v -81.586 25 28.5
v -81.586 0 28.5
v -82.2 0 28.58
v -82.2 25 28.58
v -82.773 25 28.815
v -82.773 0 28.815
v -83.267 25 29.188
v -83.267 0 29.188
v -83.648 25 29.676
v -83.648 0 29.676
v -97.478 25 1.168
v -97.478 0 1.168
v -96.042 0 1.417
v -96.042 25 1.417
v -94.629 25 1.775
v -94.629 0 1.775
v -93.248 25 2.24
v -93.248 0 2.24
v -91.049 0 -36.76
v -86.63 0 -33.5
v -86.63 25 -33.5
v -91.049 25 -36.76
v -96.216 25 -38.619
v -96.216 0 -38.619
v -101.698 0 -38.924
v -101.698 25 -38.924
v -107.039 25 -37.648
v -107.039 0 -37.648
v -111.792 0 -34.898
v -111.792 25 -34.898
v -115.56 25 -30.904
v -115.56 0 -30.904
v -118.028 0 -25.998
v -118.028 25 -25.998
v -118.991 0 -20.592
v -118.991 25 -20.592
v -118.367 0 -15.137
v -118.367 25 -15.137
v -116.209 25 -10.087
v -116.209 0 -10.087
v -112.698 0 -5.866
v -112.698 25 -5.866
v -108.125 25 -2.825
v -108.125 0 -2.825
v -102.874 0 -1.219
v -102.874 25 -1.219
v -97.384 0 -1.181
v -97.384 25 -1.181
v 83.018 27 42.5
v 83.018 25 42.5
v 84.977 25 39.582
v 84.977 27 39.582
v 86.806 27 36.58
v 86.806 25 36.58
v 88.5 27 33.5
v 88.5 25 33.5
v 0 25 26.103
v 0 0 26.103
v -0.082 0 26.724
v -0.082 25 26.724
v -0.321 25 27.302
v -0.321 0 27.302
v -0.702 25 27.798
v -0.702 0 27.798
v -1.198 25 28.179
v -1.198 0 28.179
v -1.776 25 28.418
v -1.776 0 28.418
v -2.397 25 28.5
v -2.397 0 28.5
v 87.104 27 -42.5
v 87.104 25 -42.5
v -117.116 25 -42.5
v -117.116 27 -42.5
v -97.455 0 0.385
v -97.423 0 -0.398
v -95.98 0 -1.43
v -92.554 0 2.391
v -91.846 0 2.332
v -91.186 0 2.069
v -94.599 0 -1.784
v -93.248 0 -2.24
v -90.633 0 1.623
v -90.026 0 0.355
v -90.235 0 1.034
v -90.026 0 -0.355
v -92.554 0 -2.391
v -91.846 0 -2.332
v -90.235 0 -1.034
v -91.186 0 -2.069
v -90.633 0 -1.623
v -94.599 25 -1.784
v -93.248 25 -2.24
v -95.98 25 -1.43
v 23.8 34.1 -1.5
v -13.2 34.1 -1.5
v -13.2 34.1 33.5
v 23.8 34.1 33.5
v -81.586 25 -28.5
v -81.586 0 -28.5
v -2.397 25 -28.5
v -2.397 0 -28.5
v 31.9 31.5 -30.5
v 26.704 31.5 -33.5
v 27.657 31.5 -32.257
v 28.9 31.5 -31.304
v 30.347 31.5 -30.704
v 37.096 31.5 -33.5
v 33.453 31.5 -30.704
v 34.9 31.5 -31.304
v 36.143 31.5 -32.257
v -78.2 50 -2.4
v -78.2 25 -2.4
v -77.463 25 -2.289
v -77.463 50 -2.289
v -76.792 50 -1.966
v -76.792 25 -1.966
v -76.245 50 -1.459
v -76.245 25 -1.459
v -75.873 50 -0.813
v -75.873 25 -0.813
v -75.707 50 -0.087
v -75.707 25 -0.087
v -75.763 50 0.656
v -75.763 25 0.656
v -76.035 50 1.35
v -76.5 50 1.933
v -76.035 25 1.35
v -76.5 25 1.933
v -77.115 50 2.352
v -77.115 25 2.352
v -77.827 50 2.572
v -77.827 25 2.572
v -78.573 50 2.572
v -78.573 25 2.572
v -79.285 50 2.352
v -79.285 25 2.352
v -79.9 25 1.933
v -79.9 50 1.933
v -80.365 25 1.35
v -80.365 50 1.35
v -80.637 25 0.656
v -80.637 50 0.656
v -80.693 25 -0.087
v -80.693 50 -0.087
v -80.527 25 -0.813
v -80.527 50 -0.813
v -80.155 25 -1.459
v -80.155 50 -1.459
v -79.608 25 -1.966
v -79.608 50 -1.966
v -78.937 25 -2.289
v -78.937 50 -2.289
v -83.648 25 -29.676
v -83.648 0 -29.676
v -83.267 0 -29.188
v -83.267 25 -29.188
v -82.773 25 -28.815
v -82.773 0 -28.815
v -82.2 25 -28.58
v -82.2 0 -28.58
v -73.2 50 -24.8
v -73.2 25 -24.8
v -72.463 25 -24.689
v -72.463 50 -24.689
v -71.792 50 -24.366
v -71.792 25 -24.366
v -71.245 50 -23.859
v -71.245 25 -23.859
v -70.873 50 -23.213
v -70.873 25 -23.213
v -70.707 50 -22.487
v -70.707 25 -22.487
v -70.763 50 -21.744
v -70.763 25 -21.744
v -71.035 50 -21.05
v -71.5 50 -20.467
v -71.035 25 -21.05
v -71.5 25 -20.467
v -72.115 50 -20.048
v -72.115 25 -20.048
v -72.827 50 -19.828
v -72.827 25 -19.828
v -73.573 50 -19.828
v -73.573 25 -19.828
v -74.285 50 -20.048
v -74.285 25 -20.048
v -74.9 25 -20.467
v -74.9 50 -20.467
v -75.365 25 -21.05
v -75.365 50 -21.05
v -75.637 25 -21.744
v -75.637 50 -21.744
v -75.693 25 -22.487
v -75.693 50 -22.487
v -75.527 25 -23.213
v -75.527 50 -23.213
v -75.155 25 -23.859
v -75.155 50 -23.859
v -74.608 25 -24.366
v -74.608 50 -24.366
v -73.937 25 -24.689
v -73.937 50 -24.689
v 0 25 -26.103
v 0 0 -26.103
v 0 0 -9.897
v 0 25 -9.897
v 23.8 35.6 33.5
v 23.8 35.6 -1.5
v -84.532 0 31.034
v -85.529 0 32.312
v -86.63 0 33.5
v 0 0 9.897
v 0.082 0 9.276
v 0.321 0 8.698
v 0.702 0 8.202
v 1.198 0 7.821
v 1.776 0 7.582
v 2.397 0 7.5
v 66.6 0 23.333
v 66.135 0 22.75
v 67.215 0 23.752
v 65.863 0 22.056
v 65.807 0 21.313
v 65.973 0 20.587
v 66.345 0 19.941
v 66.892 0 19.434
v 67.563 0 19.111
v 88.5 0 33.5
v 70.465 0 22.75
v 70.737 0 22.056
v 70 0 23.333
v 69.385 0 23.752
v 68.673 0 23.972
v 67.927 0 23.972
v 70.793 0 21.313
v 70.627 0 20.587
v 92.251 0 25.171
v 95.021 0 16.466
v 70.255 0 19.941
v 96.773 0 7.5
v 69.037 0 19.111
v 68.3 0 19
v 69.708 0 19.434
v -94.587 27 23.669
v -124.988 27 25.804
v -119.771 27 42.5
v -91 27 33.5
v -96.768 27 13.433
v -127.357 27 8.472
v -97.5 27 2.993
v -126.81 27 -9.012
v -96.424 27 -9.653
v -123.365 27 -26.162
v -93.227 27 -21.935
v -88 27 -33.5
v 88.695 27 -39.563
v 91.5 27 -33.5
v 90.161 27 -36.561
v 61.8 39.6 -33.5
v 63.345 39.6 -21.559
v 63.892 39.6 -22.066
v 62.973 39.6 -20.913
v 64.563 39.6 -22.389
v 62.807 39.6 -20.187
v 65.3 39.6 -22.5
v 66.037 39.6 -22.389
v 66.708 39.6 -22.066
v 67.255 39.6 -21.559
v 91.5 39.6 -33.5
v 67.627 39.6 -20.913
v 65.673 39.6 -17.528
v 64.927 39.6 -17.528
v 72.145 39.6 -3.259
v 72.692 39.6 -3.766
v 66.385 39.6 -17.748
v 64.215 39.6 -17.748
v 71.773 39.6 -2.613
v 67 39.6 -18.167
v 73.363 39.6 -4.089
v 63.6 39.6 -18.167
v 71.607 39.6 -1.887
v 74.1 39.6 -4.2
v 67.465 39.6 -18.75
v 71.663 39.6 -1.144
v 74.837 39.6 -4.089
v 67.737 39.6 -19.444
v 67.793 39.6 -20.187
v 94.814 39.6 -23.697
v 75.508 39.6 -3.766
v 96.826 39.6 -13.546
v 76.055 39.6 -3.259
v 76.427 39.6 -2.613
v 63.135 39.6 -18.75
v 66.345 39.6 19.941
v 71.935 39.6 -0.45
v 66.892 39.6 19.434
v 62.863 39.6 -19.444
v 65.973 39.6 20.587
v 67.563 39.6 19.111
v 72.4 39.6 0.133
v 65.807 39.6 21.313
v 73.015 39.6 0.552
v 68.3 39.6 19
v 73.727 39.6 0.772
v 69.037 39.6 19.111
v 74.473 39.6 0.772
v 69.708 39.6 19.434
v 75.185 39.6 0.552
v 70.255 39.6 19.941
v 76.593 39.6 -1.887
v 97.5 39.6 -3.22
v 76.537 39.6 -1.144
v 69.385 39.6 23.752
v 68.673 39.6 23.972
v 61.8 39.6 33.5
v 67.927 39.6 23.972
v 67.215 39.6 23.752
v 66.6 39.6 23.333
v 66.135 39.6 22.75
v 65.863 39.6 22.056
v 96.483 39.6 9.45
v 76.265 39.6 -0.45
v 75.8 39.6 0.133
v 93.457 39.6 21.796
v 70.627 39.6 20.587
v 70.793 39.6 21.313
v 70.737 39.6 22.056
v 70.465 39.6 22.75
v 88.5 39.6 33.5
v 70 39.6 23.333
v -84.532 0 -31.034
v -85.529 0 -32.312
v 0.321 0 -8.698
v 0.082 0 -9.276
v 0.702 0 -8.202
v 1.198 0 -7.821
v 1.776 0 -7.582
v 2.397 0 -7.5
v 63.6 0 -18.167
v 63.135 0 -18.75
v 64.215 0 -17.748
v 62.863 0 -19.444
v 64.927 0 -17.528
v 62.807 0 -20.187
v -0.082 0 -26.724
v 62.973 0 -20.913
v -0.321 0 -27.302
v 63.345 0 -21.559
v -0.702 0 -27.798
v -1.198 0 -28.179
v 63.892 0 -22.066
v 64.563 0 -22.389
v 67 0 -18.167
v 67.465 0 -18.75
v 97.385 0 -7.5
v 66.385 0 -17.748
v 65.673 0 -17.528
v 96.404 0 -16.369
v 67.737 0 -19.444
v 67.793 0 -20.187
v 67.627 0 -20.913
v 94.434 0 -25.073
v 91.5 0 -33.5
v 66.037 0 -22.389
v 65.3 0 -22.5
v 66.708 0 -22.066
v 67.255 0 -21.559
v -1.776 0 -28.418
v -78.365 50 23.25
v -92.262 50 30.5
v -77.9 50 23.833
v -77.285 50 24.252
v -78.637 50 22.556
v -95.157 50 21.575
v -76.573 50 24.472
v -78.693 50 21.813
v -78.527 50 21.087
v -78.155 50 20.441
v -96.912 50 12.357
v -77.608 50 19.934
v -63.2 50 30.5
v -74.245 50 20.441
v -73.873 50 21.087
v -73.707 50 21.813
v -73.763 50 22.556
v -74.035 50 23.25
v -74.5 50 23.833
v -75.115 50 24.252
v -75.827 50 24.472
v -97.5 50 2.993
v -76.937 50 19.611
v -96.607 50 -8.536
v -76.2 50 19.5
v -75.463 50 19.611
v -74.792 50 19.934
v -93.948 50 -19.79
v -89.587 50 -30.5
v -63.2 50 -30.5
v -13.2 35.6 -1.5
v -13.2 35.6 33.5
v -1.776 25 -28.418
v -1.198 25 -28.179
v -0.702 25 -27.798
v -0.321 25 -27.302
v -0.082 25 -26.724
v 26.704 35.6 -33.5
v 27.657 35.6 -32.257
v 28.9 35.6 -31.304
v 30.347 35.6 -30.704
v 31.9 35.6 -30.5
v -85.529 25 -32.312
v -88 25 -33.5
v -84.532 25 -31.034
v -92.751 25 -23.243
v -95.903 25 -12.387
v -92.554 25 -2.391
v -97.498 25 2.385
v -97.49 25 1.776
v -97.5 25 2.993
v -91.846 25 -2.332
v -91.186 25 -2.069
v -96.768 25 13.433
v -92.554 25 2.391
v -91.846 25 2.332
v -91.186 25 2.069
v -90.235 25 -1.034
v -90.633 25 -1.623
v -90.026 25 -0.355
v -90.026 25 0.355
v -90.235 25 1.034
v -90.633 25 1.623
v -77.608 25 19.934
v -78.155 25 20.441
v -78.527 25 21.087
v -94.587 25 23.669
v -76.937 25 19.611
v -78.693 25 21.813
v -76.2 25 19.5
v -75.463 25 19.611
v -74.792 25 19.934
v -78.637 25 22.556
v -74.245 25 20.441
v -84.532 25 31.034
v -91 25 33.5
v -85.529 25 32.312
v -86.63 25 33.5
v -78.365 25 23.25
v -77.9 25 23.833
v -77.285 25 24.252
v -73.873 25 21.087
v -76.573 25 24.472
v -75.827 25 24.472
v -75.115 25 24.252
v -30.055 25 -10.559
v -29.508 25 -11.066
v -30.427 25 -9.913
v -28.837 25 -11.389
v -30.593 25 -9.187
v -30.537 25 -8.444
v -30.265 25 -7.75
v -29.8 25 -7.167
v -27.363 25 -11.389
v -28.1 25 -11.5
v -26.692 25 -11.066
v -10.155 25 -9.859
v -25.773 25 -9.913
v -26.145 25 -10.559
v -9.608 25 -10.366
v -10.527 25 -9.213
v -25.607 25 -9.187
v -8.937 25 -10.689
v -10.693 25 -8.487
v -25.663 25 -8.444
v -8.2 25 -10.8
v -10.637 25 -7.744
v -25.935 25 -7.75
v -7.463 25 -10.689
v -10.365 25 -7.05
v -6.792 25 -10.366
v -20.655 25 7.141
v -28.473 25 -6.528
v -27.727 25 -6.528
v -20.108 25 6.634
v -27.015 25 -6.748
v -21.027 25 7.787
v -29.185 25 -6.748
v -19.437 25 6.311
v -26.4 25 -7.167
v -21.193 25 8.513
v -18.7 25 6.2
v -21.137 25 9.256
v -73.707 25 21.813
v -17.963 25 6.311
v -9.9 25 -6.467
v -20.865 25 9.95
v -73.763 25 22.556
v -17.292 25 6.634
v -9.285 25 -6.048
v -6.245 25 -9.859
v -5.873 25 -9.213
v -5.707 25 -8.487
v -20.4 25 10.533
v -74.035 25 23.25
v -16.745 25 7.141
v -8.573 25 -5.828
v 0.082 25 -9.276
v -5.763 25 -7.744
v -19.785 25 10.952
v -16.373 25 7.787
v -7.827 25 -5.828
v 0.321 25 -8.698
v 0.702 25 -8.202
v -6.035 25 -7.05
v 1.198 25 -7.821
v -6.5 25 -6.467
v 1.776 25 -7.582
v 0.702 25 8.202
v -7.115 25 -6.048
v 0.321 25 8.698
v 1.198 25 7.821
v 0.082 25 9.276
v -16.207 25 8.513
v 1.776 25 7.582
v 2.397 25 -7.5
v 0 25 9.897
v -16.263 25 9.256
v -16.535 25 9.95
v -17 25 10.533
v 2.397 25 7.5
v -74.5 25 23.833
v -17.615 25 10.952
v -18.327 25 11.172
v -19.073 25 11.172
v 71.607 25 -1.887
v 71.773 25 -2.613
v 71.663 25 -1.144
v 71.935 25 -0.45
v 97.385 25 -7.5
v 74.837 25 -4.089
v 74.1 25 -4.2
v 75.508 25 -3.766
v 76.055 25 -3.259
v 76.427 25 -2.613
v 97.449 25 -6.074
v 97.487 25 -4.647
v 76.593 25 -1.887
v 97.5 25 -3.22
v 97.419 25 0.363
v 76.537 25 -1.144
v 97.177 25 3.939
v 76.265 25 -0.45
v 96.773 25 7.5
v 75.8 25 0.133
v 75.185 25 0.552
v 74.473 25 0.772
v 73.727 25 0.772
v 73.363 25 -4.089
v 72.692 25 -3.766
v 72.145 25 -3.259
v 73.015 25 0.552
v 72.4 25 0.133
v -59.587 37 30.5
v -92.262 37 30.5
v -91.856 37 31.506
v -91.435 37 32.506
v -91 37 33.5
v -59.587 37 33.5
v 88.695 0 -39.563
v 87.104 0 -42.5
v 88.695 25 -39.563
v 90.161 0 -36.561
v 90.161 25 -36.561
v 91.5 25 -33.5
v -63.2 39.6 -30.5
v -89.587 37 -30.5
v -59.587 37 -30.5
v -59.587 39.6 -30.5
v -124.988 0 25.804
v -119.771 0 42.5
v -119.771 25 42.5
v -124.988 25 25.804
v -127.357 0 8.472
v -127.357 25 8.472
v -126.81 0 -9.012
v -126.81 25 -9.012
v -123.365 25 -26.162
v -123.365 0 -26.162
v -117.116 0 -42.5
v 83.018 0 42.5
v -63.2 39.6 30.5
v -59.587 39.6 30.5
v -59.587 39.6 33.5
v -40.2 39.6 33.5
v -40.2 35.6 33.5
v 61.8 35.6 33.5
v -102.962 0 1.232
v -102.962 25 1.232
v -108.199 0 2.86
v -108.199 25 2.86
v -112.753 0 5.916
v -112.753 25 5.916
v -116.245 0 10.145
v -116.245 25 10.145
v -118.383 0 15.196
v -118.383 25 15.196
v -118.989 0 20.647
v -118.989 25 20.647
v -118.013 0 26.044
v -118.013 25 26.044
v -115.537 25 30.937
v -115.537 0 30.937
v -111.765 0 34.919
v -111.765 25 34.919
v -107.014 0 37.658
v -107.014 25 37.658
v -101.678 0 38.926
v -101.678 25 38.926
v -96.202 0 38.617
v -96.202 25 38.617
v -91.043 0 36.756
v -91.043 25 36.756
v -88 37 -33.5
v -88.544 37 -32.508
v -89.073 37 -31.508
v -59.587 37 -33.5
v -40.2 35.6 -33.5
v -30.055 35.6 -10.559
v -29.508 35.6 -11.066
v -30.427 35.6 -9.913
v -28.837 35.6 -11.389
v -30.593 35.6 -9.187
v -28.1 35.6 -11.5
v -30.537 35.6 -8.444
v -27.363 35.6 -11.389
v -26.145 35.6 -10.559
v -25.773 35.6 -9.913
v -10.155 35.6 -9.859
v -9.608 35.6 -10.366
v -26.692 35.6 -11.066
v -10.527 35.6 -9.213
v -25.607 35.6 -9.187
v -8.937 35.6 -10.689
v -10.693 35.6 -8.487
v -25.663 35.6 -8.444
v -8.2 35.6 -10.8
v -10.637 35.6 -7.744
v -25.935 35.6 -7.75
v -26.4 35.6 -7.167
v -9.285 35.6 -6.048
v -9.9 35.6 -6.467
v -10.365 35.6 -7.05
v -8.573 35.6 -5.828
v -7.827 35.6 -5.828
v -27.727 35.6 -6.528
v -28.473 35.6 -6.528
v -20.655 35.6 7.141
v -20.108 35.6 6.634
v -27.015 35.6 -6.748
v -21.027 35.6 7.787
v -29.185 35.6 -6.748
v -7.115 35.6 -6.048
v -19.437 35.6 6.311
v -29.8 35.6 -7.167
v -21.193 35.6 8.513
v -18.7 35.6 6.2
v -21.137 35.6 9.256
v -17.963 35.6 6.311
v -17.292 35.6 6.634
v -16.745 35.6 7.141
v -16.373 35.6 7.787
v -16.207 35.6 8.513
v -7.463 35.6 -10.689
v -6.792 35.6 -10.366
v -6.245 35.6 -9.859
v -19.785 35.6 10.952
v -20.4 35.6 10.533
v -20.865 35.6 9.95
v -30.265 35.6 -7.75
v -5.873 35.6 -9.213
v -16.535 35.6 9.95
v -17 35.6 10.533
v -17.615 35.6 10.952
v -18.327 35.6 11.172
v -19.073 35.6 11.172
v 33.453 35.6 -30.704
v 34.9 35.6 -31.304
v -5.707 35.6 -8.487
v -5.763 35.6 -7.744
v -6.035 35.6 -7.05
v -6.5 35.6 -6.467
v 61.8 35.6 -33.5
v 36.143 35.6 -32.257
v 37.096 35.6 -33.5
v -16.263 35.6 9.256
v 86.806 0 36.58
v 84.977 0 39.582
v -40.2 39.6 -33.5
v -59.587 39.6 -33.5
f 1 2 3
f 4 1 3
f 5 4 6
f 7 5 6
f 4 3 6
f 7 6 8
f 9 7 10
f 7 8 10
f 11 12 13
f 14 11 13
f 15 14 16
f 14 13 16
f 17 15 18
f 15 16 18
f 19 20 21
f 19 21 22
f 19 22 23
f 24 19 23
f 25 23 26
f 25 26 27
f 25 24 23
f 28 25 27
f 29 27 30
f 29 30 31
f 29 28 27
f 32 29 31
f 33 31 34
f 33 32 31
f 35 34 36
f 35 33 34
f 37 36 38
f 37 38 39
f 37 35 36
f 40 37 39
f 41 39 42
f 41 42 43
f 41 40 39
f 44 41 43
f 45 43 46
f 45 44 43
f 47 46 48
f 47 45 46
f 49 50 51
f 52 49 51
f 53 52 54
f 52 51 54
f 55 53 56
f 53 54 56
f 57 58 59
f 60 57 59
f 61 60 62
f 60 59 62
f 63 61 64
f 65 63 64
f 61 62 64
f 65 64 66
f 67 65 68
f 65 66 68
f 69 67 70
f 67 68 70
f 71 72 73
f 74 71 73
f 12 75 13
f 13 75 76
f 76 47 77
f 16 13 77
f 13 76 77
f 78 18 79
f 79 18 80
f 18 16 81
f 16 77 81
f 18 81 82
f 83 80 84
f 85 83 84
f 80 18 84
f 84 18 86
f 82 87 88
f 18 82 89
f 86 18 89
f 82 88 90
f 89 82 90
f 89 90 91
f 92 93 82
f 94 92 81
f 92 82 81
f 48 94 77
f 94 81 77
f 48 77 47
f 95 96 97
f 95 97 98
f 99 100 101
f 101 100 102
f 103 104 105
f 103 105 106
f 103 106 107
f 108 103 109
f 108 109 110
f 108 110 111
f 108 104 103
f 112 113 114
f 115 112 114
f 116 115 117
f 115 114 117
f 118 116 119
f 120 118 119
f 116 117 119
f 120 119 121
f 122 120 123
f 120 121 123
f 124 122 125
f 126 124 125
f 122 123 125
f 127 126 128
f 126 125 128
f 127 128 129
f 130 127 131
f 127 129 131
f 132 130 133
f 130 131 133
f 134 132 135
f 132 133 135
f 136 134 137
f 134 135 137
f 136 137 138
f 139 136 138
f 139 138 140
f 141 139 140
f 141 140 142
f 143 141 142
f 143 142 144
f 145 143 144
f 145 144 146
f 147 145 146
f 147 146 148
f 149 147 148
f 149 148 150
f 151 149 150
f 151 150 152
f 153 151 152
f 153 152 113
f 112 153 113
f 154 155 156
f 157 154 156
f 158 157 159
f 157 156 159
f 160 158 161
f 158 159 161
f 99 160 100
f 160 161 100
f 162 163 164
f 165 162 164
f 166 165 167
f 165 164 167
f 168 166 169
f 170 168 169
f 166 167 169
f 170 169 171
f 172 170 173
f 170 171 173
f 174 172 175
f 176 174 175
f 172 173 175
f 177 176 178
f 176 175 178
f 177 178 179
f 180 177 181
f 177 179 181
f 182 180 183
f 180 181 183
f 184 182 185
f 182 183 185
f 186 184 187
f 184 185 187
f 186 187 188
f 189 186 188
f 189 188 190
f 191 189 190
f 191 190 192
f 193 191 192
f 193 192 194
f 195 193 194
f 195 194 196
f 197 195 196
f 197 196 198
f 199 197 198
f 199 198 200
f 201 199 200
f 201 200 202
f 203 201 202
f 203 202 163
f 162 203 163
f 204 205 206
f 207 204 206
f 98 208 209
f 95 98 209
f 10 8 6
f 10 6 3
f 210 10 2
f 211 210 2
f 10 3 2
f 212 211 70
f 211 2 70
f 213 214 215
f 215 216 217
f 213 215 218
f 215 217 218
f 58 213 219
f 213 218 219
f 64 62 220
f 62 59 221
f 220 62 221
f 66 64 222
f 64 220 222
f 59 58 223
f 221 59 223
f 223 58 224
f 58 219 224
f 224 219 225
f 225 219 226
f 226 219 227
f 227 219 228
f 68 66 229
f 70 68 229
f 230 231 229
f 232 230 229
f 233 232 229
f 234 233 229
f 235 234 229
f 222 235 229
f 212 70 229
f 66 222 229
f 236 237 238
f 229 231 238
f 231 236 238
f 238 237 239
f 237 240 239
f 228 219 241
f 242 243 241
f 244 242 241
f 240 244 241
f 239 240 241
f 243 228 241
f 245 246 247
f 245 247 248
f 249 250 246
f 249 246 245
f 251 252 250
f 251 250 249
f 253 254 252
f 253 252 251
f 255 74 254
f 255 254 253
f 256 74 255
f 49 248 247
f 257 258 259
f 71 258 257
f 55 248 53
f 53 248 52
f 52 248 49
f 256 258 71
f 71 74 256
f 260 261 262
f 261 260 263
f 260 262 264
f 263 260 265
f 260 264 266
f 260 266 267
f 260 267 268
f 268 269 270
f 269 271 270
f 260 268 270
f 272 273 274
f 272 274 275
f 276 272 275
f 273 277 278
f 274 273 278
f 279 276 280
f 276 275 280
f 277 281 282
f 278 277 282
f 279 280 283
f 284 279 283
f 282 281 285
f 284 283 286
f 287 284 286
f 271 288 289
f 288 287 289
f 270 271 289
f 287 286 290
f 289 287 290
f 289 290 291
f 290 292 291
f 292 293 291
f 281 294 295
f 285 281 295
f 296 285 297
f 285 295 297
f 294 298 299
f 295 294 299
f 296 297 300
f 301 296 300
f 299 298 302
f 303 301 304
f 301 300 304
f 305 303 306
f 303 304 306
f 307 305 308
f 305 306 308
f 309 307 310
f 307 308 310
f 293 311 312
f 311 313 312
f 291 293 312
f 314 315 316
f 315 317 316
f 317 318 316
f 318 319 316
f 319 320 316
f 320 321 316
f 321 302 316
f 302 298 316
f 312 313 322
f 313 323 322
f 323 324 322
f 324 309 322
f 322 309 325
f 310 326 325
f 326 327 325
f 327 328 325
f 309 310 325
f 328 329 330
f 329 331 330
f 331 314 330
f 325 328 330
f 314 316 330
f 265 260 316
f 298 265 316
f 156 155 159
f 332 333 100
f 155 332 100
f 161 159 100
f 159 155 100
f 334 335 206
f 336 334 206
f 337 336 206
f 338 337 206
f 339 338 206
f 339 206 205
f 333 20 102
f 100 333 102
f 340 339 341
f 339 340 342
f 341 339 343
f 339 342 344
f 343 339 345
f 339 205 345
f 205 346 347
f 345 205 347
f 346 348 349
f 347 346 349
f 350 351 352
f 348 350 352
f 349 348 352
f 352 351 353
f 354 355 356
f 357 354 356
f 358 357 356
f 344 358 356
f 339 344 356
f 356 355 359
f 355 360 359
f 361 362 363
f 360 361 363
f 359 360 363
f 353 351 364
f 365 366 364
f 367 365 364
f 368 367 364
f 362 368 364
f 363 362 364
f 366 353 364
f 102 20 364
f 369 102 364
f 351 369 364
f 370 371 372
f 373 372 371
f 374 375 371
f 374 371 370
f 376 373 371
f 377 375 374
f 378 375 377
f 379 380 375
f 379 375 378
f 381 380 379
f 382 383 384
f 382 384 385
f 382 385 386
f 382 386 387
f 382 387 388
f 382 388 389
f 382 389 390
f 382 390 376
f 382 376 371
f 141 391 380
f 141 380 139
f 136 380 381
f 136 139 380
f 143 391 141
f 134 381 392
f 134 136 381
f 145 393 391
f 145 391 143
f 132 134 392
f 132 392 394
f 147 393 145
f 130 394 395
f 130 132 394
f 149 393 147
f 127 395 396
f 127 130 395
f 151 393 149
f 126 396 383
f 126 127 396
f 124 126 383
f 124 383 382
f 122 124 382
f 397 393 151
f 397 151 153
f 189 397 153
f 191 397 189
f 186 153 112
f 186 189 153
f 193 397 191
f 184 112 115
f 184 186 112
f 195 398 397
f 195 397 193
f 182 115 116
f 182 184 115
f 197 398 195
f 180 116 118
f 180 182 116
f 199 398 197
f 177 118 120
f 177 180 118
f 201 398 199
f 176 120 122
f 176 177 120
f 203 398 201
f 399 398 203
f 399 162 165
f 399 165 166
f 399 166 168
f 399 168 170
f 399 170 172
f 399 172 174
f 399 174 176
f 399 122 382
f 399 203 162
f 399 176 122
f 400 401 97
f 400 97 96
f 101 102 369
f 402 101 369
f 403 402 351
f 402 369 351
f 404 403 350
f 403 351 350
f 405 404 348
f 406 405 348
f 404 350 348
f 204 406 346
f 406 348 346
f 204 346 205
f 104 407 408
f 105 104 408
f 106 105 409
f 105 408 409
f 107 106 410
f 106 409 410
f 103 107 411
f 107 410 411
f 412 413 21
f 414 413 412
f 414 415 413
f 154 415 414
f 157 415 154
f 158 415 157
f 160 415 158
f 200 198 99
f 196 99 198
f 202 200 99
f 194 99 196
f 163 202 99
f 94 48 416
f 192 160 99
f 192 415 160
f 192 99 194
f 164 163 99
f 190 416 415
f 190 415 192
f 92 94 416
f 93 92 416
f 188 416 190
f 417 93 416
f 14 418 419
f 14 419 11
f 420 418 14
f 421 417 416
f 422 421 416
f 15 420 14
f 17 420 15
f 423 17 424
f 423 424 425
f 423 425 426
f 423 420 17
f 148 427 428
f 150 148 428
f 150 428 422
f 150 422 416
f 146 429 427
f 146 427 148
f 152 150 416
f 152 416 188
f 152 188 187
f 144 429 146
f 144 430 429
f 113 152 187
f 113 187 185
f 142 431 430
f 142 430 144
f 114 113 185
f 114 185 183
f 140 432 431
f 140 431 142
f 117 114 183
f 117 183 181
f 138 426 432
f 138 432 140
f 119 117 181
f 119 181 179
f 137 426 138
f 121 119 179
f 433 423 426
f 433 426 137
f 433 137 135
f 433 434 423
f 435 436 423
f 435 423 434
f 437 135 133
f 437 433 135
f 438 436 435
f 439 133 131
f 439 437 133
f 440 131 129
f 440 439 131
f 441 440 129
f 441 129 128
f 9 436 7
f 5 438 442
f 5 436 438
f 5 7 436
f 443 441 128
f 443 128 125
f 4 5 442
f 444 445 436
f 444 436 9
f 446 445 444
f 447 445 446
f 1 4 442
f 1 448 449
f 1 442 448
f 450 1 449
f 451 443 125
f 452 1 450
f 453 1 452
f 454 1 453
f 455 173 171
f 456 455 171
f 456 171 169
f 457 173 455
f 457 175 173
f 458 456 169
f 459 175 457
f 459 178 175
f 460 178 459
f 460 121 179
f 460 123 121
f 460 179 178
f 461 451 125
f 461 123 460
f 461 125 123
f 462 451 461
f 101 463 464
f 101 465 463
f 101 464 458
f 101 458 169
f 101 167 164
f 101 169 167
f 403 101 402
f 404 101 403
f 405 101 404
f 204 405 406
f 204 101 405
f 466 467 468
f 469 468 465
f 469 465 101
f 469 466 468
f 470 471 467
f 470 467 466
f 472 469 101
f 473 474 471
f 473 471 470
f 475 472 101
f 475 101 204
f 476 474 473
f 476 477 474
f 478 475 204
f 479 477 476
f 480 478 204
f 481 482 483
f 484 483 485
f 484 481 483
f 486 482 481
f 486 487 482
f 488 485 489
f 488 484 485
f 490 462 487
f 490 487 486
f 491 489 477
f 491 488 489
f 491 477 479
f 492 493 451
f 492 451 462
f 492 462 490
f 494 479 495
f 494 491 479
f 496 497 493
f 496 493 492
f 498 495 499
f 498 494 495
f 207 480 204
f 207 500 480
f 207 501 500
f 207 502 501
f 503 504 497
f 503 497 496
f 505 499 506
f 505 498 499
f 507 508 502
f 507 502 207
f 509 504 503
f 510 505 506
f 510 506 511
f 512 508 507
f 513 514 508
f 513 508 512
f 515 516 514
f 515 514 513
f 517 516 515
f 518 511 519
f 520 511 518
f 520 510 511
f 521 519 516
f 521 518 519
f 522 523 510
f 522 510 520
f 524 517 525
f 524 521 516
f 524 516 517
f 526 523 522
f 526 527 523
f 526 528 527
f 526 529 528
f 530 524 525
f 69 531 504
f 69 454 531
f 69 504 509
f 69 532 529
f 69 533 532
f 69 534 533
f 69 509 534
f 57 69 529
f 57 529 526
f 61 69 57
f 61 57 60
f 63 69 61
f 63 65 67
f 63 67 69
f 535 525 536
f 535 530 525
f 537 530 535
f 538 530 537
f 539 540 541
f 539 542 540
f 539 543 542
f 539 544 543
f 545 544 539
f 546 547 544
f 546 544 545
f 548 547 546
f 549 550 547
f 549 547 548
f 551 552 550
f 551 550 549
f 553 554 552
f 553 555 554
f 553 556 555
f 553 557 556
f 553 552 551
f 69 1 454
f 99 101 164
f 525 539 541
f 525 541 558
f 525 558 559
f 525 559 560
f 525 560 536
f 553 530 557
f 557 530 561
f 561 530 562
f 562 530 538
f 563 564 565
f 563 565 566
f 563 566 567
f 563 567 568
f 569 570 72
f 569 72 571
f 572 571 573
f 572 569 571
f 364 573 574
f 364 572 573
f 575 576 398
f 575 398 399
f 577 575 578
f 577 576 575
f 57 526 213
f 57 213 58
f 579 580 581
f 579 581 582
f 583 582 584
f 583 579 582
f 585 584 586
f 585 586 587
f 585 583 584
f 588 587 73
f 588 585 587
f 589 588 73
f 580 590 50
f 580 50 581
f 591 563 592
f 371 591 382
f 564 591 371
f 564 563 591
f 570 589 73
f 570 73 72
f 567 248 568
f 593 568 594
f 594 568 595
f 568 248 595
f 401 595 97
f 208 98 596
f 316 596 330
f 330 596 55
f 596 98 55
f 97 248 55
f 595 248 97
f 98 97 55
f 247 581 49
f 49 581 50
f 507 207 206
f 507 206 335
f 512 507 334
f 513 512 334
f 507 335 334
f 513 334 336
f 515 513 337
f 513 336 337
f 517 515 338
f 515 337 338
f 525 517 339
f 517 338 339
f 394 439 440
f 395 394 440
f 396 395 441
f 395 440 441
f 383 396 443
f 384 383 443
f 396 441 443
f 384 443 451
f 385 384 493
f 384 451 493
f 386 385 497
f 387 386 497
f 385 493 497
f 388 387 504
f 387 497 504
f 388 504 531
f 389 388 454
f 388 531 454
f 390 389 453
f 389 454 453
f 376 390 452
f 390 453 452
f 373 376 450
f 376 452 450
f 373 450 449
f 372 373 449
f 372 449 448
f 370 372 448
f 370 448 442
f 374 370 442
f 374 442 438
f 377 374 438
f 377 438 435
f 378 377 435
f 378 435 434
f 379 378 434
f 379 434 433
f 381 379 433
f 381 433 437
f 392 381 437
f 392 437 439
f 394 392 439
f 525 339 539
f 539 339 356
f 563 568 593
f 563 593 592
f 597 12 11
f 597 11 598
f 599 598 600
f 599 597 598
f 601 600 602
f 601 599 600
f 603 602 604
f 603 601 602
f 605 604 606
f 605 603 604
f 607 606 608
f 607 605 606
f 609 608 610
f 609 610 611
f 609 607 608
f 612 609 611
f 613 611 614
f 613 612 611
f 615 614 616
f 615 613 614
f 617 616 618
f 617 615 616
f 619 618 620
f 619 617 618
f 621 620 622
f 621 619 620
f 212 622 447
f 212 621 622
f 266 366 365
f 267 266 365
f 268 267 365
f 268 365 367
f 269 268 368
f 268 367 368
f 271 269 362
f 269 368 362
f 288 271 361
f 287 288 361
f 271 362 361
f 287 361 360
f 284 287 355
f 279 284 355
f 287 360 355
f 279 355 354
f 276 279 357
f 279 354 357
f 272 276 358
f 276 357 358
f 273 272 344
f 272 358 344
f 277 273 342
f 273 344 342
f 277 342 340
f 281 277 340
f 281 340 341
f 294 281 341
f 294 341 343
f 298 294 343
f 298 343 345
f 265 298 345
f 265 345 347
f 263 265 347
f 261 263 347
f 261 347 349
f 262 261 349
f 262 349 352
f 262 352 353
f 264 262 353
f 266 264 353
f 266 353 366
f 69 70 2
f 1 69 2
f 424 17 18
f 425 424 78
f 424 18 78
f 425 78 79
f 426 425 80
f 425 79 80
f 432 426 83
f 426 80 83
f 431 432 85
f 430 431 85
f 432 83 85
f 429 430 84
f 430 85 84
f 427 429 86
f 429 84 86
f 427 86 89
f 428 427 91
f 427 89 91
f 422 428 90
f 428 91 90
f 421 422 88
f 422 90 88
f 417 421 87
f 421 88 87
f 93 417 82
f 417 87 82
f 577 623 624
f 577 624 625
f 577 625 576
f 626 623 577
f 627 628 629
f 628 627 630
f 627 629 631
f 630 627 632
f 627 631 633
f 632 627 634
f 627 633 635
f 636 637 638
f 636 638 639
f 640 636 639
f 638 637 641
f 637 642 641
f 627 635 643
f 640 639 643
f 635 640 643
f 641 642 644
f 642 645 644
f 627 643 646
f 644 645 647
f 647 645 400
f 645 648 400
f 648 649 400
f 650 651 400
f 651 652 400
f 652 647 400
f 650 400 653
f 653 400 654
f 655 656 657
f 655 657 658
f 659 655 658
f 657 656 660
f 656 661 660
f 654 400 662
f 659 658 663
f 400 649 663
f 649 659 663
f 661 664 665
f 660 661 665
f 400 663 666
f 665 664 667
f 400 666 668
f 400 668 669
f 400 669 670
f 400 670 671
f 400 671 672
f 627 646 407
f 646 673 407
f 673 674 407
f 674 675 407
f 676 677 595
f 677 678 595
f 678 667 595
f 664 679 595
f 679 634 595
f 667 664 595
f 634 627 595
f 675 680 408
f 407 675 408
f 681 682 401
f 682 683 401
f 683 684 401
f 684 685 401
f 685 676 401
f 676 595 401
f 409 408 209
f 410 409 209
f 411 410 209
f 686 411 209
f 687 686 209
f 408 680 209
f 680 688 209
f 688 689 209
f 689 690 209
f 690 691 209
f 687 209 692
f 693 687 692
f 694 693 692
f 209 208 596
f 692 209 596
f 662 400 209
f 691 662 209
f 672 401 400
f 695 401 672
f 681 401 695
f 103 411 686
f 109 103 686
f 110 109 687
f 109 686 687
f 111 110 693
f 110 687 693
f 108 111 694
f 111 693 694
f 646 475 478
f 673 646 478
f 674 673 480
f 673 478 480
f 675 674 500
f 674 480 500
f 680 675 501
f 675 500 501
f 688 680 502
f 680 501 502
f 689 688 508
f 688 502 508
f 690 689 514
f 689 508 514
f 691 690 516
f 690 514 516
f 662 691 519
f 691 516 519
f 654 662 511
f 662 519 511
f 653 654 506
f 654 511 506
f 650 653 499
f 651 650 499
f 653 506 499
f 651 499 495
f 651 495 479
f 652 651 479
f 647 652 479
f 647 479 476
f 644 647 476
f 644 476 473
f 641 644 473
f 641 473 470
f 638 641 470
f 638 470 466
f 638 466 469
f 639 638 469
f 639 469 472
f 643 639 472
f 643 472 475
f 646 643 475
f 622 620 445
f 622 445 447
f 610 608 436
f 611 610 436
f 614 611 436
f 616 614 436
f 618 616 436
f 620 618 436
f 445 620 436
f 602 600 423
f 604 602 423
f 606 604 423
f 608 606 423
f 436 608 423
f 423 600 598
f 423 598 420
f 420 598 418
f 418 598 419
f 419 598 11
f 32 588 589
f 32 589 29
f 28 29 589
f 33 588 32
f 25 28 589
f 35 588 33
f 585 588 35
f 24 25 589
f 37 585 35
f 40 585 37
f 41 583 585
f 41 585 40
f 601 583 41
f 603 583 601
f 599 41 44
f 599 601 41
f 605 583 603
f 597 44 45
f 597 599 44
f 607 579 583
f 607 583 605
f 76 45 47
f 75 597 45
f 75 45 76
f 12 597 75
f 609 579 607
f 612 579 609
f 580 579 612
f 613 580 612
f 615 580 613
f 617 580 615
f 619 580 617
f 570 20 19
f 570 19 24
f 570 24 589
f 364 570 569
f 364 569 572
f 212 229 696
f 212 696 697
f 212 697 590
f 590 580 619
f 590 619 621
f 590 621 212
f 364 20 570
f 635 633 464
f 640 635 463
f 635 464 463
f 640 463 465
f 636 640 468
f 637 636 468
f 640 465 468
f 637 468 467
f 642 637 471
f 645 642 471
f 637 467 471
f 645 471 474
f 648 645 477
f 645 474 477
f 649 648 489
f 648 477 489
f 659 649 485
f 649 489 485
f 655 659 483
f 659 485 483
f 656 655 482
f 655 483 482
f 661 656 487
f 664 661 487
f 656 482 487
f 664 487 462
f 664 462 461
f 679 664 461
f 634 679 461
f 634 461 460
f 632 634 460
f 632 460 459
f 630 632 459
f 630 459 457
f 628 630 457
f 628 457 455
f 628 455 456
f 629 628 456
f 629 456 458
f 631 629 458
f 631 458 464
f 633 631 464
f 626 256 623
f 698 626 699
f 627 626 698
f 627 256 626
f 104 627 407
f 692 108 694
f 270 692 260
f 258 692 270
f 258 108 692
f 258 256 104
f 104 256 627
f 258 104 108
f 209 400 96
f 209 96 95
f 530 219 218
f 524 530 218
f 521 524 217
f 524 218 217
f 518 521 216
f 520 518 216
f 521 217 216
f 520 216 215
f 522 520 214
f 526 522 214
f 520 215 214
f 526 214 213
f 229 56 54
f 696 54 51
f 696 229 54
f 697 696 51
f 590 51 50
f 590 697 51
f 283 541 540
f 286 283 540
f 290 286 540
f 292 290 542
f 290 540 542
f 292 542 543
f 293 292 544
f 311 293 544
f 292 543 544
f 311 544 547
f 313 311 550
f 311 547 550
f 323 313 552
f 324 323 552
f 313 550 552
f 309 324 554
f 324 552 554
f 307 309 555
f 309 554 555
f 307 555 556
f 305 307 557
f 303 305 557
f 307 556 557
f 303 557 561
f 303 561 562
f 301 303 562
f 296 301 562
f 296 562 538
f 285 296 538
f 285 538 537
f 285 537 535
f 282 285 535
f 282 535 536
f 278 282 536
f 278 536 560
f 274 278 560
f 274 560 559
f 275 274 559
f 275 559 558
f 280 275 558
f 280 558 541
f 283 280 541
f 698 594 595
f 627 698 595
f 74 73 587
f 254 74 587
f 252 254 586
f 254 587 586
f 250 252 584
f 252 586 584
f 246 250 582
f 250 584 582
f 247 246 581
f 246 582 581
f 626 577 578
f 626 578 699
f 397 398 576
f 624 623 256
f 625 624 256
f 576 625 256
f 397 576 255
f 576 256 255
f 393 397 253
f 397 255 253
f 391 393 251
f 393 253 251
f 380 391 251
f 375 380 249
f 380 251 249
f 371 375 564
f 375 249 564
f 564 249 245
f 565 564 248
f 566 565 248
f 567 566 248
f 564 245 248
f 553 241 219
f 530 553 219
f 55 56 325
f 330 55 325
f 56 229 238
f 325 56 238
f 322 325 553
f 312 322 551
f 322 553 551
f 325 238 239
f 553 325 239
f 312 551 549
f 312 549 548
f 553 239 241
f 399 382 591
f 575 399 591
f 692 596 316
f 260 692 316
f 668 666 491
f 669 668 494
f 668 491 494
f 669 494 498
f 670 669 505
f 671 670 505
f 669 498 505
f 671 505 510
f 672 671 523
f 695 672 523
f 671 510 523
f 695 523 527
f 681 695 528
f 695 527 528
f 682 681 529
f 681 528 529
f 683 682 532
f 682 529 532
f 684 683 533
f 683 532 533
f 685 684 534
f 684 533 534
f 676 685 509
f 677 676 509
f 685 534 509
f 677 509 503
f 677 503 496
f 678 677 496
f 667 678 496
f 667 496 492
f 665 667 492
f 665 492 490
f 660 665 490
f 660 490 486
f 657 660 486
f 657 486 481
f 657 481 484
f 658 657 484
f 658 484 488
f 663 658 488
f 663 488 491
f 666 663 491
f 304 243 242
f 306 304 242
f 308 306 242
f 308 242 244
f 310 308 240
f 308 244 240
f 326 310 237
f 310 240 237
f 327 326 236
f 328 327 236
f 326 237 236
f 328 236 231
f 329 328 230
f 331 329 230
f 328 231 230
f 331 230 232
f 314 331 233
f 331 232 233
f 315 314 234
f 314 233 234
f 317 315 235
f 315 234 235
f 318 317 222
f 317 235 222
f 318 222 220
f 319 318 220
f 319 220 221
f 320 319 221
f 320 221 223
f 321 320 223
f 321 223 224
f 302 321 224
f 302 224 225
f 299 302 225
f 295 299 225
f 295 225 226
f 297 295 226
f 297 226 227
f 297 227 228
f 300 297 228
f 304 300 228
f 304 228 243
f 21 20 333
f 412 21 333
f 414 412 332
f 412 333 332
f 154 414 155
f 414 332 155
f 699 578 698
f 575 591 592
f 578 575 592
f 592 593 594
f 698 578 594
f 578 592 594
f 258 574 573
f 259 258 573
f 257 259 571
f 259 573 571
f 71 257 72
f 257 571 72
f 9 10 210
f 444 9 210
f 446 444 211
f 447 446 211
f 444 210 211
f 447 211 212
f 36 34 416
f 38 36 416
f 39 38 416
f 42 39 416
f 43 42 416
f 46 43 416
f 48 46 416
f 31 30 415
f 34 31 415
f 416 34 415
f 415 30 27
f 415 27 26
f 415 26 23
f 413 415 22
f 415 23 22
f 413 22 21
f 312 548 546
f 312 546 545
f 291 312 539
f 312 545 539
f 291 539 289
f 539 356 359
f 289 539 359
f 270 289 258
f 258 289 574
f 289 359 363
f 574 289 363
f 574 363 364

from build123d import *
from build123d.topology import SkipClean

# Parameters (mm, degrees)
SKETCH1_W           = 195
SKETCH1_H           = 67
BOSS_EXTRUDE1_DEPTH = 50
CUT_EXTRUDE1_DEPTH  = 115.579666608
CUT_EXTRUDE2_DEPTH  = 129.433835106
CUT_EXTRUDE3_START  = -13
SKETCH4_W           = 3.612655346
SKETCH4_H           = 3
CUT_EXTRUDE3_DEPTH  = 13
SKETCH6_R           = 2.5
CUT_EXTRUDE4_DEPTH  = 115.579666608
SKETCH7_W           = 37
SKETCH7_H           = 35
CUT_EXTRUDE5_DEPTH  = 1.5
CUT_EXTRUDE6_DEPTH  = 18.5
SKETCH9_R           = 2.5
CUT_EXTRUDE7_DEPTH  = 25
BOSS_EXTRUDE2_START = 25
BOSS_EXTRUDE2_DEPTH = 25
BOSS_EXTRUDE3_DEPTH = 2


with BuildPart() as part:
    # Sketch1 → Boss-Extrude1 (new body)
    with BuildSketch(Plane(origin=(0, 0, 0), x_dir=(1, 0, 0), z_dir=(0, 1, 0))):
        Rectangle(SKETCH1_W, SKETCH1_H)
    extrude(amount=BOSS_EXTRUDE1_DEPTH)

    # Sketch2 → Cut-Extrude1 (cut, through all)
    with BuildSketch(Plane.XZ):
        with BuildLine():
            Line((97.5, -3.219751644), (97.5, 33.5))
            Line((97.5, 33.5), (88.5, 33.5))
            ThreePointArc((88.5, 33.5), (95.217186872, 15.683556008), (97.5, -3.219751644))
        make_face()
        with BuildLine():
            Line((97.5, -33.5), (97.5, -3.219751644))
            ThreePointArc((97.5, -3.219751644), (95.985558513, -18.65423771), (91.5, -33.5))
            Line((91.5, -33.5), (97.5, -33.5))
        make_face()
        with BuildLine():
            ThreePointArc((-88, -33.5), (-95.08607052, -15.861694529), (-97.5, 2.992884749))
            Line((-97.5, 2.992884749), (-97.5, -33.5))
            Line((-97.5, -33.5), (-88, -33.5))
        make_face()
        with BuildLine():
            ThreePointArc((-97.5, 2.992884749), (-95.856964648, 18.588830376), (-91, 33.5))
            Line((-91, 33.5), (-97.5, 33.5))
            Line((-97.5, 33.5), (-97.5, 2.992884749))
        make_face()
    extrude(amount=-CUT_EXTRUDE1_DEPTH, mode=Mode.SUBTRACT)

    # Sketch3 → Cut-Extrude2 (cut, through all)
    with BuildSketch(Plane(origin=(0, 0, 33.5), x_dir=(-1, 0, 0), z_dir=(0, 0, -1))):
        Polygon((63.2, 50), (63.2, 39.6), (40.2, 39.6), (40.2, 35.6), (-61.8, 35.6), (-61.8, 39.6), (-97.5, 39.6), (-97.5, 50), align=None)
    extrude(amount=CUT_EXTRUDE2_DEPTH, mode=Mode.SUBTRACT)

    # Sketch4 → Cut-Extrude3 (cut)
    with BuildSketch(Plane(origin=(0, 50, 0), x_dir=(1, 0, 0), z_dir=(0, 1, 0)).offset(CUT_EXTRUDE3_START)):
        with BuildLine():
            Line((-63.2, 30.5), (-63.2, 33.5))
            Line((-63.2, 33.5), (-88, 33.5))
            ThreePointArc((-88, 33.5), (-88.810680862, 32.008999469), (-89.587344654, 30.5))
            Line((-89.587344654, 30.5), (-63.2, 30.5))
        make_face()
        with Locations((-61.393672327, 32)):
            Rectangle(SKETCH4_W, SKETCH4_H)
        with BuildLine():
            Line((-63.2, -33.5), (-63.2, -30.5))
            Line((-63.2, -30.5), (-92.261692194, -30.5))
            ThreePointArc((-92.261692194, -30.5), (-91.647155152, -32.006859002), (-91, -33.5))
            Line((-91, -33.5), (-63.2, -33.5))
        make_face()
        with Locations((-61.393672327, -32)):
            Rectangle(SKETCH4_W, SKETCH4_H)
    extrude(amount=CUT_EXTRUDE3_DEPTH, mode=Mode.SUBTRACT)

    # Sketch6 → Cut-Extrude4 (cut, through all)
    with BuildSketch(Plane.XZ):
        with Locations(Location((-28.1, -9, 0), (0, 0, 270))):
            Circle(SKETCH6_R)
        with Locations(Location((-8.2, -8.3, 0), (0, 0, 270))):
            Circle(SKETCH6_R)
        with Locations(Location((-18.7, 8.7, 0), (0, 0, 270))):
            Circle(SKETCH6_R)
        with Locations(Location((-76.2, 22, 0), (0, 0, 270))):
            Circle(SKETCH6_R)
        with Locations(Location((-78.2, 0.1, 0), (0, 0, 270))):
            Circle(SKETCH6_R)
        with Locations(Location((-73.2, -22.3, 0), (0, 0, 270))):
            Circle(SKETCH6_R)
        with Locations(Location((65.3, -20, 0), (0, 0, 270))):
            Circle(SKETCH6_R)
        with Locations(Location((74.1, -1.7, 0), (0, 0, 270))):
            Circle(SKETCH6_R)
        with Locations(Location((68.3, 21.5, 0), (0, 0, 270))):
            Circle(SKETCH6_R)
    extrude(amount=-CUT_EXTRUDE4_DEPTH, mode=Mode.SUBTRACT)

    # Sketch7 → Cut-Extrude5 (cut)
    with BuildSketch(Plane(origin=(0, 35.6, 0), x_dir=(1, 0, 0), z_dir=(0, 1, 0))):
        with Locations((5.3, -16)):
            Rectangle(SKETCH7_W, SKETCH7_H)
    extrude(amount=-CUT_EXTRUDE5_DEPTH, mode=Mode.SUBTRACT)

    # Sketch8 → Cut-Extrude6 (cut)
    with BuildSketch(Plane(origin=(0, 50, 0), x_dir=(1, 0, 0), z_dir=(0, 1, 0))):
        with BuildLine():
            Line((37.096152423, 33.5), (31.9, 33.5))
            Line((31.9, 33.5), (31.9, 30.5))
            ThreePointArc((31.9, 30.5), (34.9, 31.303847577), (37.096152423, 33.5))
        make_face()
        with BuildLine():
            Line((31.9, 33.5), (26.703847577, 33.5))
            ThreePointArc((26.703847577, 33.5), (28.9, 31.303847577), (31.9, 30.5))
            Line((31.9, 30.5), (31.9, 33.5))
        make_face()
    extrude(amount=-CUT_EXTRUDE6_DEPTH, mode=Mode.SUBTRACT)

    # Sketch9 → Cut-Extrude7 (cut)
    with BuildSketch(Plane.XZ):
        with BuildLine():
            Line((-2.396551724, 28.5), (-81.585940529, 28.5))
            ThreePointArc((-81.585940529, 28.5), (-82.773060502, 28.814676047), (-83.648434047, 29.676067945))
            ThreePointArc((-83.648434047, 29.676067945), (-85.016854467, 31.683550399), (-86.630258043, 33.5))
            Line((-86.630258043, 33.5), (-91, 33.5))
            ThreePointArc((-91, 33.5), (-96.041663789, 17.695271398), (-97.477752055, 1.168158207))
            ThreePointArc((-97.477752055, 1.168158207), (-95.332095511, 1.5823273), (-93.248186912, 2.240128941))
            ThreePointArc((-93.248186912, 2.240128941), (-90, -7e-09), (-93.248186926, -2.240128936))
            ThreePointArc((-93.248186926, -2.240128936), (-95.286014537, -1.594067776), (-97.383519589, -1.181019415))
            ThreePointArc((-97.383519589, -1.181019415), (-94.531917422, -17.874782597), (-88, -33.5))
            Line((-88, -33.5), (-86.630258043, -33.5))
            ThreePointArc((-86.630258043, -33.5), (-85.016854382, -31.683550291), (-83.648433906, -29.676067708))
            ThreePointArc((-83.648433906, -29.676067708), (-82.773060382, -28.814675978), (-81.585940529, -28.5))
            Line((-81.585940529, -28.5), (-2.396551708, -28.5))
            ThreePointArc((-2.396551708, -28.5), (-0.701933743, -27.798066246), (0, -26.103448276))
            Line((0, -26.103448276), (0, -9.896551726))
            ThreePointArc((0, -9.896551726), (0.701933748, -8.201933749), (2.396551724, -7.5))
            Line((2.396551724, -7.5), (97.384558849, -7.5))
            ThreePointArc((97.384558849, -7.5), (97.434108416, 0.014482123), (96.773110049, 7.5))
            Line((96.773110049, 7.5), (2.396551724, 7.5))
            ThreePointArc((2.396551724, 7.5), (0.70193375, 8.201933747), (0, 9.896551721))
            Line((0, 9.896551721), (0, 26.103448276))
            ThreePointArc((0, 26.103448276), (-0.701933749, 27.798066251), (-2.396551724, 28.5))
        make_face()
        with Locations(Location((-73.2, -22.3, 0), (0, 0, 270))):
            Circle(SKETCH9_R, mode=Mode.SUBTRACT)
        with Locations(Location((-78.2, 0.1, 0), (0, 0, 270))):
            Circle(SKETCH9_R, mode=Mode.SUBTRACT)
        with Locations(Location((-28.1, -9, 0), (0, 0, 270))):
            Circle(SKETCH9_R, mode=Mode.SUBTRACT)
        with Locations(Location((-8.2, -8.3, 0), (0, 0, 270))):
            Circle(SKETCH9_R, mode=Mode.SUBTRACT)
        with Locations(Location((-76.2, 22, 0), (0, 0, 270))):
            Circle(SKETCH9_R, mode=Mode.SUBTRACT)
        with Locations(Location((-18.7, 8.7, 0), (0, 0, 270))):
            Circle(SKETCH9_R, mode=Mode.SUBTRACT)
        with Locations(Location((74.1, -1.7, 0), (0, 0, 270))):
            Circle(SKETCH9_R, mode=Mode.SUBTRACT)
    extrude(amount=-CUT_EXTRUDE7_DEPTH, mode=Mode.SUBTRACT)

    # Sketch10 → Boss-Extrude2 (add)
    with SkipClean():  # the faces are left unmerged after this step: merging them gives an invalid solid
        with BuildSketch(Plane.XZ.offset(-25).offset(BOSS_EXTRUDE2_START)):
            with BuildLine():
                ThreePointArc((-97.477752055, 1.168158207), (-118.013212767, 26.043522633), (-86.630258043, 33.5))
                Line((-86.630258043, 33.5), (88.5, 33.5))
                ThreePointArc((88.5, 33.5), (85.908246666, 38.091048485), (83.017561959, 42.5))
                Line((83.017561959, 42.5), (-119.771431792, 42.5))
                ThreePointArc((-119.771431792, 42.5), (-127.448858613, -0.281382159), (-117.115521807, -42.5))
                Line((-117.115521807, -42.5), (87.104231658, -42.5))
                ThreePointArc((87.104231658, -42.5), (89.444159442, -38.069376757), (91.5, -33.5))
                Line((91.5, -33.5), (-86.630258043, -33.5))
                ThreePointArc((-86.630258043, -33.5), (-118.028282029, -25.998420382), (-97.383519589, -1.181019415))
                ThreePointArc((-97.383519589, -1.181019415), (-97.43986106, -0.006800655), (-97.477752055, 1.168158207))
            make_face()
        extrude(amount=-BOSS_EXTRUDE2_DEPTH)

    # Sketch11 → Boss-Extrude3 (add)
    with SkipClean():  # the faces are left unmerged after this step: merging them gives an invalid solid
        with BuildSketch(Plane(origin=(0, 25, 0), x_dir=(1, 0, 0), z_dir=(0, 1, 0))):
            with BuildLine():
                ThreePointArc((83.017561959, -42.5), (85.908246666, -38.091048485), (88.5, -33.5))
                Line((88.5, -33.5), (-91, -33.5))
                ThreePointArc((-91, -33.5), (-97.425088146, 0.354854693), (-88, 33.5))
                Line((-88, 33.5), (91.5, 33.5))
                ThreePointArc((91.5, 33.5), (89.444159442, 38.069376757), (87.104231658, 42.5))
                Line((87.104231658, 42.5), (-117.115521807, 42.5))
                ThreePointArc((-117.115521807, 42.5), (-127.448858613, 0.281382159), (-119.771431792, -42.5))
                Line((-119.771431792, -42.5), (83.017561959, -42.5))
            make_face()
        extrude(amount=BOSS_EXTRUDE3_DEPTH)


solid = part.part
